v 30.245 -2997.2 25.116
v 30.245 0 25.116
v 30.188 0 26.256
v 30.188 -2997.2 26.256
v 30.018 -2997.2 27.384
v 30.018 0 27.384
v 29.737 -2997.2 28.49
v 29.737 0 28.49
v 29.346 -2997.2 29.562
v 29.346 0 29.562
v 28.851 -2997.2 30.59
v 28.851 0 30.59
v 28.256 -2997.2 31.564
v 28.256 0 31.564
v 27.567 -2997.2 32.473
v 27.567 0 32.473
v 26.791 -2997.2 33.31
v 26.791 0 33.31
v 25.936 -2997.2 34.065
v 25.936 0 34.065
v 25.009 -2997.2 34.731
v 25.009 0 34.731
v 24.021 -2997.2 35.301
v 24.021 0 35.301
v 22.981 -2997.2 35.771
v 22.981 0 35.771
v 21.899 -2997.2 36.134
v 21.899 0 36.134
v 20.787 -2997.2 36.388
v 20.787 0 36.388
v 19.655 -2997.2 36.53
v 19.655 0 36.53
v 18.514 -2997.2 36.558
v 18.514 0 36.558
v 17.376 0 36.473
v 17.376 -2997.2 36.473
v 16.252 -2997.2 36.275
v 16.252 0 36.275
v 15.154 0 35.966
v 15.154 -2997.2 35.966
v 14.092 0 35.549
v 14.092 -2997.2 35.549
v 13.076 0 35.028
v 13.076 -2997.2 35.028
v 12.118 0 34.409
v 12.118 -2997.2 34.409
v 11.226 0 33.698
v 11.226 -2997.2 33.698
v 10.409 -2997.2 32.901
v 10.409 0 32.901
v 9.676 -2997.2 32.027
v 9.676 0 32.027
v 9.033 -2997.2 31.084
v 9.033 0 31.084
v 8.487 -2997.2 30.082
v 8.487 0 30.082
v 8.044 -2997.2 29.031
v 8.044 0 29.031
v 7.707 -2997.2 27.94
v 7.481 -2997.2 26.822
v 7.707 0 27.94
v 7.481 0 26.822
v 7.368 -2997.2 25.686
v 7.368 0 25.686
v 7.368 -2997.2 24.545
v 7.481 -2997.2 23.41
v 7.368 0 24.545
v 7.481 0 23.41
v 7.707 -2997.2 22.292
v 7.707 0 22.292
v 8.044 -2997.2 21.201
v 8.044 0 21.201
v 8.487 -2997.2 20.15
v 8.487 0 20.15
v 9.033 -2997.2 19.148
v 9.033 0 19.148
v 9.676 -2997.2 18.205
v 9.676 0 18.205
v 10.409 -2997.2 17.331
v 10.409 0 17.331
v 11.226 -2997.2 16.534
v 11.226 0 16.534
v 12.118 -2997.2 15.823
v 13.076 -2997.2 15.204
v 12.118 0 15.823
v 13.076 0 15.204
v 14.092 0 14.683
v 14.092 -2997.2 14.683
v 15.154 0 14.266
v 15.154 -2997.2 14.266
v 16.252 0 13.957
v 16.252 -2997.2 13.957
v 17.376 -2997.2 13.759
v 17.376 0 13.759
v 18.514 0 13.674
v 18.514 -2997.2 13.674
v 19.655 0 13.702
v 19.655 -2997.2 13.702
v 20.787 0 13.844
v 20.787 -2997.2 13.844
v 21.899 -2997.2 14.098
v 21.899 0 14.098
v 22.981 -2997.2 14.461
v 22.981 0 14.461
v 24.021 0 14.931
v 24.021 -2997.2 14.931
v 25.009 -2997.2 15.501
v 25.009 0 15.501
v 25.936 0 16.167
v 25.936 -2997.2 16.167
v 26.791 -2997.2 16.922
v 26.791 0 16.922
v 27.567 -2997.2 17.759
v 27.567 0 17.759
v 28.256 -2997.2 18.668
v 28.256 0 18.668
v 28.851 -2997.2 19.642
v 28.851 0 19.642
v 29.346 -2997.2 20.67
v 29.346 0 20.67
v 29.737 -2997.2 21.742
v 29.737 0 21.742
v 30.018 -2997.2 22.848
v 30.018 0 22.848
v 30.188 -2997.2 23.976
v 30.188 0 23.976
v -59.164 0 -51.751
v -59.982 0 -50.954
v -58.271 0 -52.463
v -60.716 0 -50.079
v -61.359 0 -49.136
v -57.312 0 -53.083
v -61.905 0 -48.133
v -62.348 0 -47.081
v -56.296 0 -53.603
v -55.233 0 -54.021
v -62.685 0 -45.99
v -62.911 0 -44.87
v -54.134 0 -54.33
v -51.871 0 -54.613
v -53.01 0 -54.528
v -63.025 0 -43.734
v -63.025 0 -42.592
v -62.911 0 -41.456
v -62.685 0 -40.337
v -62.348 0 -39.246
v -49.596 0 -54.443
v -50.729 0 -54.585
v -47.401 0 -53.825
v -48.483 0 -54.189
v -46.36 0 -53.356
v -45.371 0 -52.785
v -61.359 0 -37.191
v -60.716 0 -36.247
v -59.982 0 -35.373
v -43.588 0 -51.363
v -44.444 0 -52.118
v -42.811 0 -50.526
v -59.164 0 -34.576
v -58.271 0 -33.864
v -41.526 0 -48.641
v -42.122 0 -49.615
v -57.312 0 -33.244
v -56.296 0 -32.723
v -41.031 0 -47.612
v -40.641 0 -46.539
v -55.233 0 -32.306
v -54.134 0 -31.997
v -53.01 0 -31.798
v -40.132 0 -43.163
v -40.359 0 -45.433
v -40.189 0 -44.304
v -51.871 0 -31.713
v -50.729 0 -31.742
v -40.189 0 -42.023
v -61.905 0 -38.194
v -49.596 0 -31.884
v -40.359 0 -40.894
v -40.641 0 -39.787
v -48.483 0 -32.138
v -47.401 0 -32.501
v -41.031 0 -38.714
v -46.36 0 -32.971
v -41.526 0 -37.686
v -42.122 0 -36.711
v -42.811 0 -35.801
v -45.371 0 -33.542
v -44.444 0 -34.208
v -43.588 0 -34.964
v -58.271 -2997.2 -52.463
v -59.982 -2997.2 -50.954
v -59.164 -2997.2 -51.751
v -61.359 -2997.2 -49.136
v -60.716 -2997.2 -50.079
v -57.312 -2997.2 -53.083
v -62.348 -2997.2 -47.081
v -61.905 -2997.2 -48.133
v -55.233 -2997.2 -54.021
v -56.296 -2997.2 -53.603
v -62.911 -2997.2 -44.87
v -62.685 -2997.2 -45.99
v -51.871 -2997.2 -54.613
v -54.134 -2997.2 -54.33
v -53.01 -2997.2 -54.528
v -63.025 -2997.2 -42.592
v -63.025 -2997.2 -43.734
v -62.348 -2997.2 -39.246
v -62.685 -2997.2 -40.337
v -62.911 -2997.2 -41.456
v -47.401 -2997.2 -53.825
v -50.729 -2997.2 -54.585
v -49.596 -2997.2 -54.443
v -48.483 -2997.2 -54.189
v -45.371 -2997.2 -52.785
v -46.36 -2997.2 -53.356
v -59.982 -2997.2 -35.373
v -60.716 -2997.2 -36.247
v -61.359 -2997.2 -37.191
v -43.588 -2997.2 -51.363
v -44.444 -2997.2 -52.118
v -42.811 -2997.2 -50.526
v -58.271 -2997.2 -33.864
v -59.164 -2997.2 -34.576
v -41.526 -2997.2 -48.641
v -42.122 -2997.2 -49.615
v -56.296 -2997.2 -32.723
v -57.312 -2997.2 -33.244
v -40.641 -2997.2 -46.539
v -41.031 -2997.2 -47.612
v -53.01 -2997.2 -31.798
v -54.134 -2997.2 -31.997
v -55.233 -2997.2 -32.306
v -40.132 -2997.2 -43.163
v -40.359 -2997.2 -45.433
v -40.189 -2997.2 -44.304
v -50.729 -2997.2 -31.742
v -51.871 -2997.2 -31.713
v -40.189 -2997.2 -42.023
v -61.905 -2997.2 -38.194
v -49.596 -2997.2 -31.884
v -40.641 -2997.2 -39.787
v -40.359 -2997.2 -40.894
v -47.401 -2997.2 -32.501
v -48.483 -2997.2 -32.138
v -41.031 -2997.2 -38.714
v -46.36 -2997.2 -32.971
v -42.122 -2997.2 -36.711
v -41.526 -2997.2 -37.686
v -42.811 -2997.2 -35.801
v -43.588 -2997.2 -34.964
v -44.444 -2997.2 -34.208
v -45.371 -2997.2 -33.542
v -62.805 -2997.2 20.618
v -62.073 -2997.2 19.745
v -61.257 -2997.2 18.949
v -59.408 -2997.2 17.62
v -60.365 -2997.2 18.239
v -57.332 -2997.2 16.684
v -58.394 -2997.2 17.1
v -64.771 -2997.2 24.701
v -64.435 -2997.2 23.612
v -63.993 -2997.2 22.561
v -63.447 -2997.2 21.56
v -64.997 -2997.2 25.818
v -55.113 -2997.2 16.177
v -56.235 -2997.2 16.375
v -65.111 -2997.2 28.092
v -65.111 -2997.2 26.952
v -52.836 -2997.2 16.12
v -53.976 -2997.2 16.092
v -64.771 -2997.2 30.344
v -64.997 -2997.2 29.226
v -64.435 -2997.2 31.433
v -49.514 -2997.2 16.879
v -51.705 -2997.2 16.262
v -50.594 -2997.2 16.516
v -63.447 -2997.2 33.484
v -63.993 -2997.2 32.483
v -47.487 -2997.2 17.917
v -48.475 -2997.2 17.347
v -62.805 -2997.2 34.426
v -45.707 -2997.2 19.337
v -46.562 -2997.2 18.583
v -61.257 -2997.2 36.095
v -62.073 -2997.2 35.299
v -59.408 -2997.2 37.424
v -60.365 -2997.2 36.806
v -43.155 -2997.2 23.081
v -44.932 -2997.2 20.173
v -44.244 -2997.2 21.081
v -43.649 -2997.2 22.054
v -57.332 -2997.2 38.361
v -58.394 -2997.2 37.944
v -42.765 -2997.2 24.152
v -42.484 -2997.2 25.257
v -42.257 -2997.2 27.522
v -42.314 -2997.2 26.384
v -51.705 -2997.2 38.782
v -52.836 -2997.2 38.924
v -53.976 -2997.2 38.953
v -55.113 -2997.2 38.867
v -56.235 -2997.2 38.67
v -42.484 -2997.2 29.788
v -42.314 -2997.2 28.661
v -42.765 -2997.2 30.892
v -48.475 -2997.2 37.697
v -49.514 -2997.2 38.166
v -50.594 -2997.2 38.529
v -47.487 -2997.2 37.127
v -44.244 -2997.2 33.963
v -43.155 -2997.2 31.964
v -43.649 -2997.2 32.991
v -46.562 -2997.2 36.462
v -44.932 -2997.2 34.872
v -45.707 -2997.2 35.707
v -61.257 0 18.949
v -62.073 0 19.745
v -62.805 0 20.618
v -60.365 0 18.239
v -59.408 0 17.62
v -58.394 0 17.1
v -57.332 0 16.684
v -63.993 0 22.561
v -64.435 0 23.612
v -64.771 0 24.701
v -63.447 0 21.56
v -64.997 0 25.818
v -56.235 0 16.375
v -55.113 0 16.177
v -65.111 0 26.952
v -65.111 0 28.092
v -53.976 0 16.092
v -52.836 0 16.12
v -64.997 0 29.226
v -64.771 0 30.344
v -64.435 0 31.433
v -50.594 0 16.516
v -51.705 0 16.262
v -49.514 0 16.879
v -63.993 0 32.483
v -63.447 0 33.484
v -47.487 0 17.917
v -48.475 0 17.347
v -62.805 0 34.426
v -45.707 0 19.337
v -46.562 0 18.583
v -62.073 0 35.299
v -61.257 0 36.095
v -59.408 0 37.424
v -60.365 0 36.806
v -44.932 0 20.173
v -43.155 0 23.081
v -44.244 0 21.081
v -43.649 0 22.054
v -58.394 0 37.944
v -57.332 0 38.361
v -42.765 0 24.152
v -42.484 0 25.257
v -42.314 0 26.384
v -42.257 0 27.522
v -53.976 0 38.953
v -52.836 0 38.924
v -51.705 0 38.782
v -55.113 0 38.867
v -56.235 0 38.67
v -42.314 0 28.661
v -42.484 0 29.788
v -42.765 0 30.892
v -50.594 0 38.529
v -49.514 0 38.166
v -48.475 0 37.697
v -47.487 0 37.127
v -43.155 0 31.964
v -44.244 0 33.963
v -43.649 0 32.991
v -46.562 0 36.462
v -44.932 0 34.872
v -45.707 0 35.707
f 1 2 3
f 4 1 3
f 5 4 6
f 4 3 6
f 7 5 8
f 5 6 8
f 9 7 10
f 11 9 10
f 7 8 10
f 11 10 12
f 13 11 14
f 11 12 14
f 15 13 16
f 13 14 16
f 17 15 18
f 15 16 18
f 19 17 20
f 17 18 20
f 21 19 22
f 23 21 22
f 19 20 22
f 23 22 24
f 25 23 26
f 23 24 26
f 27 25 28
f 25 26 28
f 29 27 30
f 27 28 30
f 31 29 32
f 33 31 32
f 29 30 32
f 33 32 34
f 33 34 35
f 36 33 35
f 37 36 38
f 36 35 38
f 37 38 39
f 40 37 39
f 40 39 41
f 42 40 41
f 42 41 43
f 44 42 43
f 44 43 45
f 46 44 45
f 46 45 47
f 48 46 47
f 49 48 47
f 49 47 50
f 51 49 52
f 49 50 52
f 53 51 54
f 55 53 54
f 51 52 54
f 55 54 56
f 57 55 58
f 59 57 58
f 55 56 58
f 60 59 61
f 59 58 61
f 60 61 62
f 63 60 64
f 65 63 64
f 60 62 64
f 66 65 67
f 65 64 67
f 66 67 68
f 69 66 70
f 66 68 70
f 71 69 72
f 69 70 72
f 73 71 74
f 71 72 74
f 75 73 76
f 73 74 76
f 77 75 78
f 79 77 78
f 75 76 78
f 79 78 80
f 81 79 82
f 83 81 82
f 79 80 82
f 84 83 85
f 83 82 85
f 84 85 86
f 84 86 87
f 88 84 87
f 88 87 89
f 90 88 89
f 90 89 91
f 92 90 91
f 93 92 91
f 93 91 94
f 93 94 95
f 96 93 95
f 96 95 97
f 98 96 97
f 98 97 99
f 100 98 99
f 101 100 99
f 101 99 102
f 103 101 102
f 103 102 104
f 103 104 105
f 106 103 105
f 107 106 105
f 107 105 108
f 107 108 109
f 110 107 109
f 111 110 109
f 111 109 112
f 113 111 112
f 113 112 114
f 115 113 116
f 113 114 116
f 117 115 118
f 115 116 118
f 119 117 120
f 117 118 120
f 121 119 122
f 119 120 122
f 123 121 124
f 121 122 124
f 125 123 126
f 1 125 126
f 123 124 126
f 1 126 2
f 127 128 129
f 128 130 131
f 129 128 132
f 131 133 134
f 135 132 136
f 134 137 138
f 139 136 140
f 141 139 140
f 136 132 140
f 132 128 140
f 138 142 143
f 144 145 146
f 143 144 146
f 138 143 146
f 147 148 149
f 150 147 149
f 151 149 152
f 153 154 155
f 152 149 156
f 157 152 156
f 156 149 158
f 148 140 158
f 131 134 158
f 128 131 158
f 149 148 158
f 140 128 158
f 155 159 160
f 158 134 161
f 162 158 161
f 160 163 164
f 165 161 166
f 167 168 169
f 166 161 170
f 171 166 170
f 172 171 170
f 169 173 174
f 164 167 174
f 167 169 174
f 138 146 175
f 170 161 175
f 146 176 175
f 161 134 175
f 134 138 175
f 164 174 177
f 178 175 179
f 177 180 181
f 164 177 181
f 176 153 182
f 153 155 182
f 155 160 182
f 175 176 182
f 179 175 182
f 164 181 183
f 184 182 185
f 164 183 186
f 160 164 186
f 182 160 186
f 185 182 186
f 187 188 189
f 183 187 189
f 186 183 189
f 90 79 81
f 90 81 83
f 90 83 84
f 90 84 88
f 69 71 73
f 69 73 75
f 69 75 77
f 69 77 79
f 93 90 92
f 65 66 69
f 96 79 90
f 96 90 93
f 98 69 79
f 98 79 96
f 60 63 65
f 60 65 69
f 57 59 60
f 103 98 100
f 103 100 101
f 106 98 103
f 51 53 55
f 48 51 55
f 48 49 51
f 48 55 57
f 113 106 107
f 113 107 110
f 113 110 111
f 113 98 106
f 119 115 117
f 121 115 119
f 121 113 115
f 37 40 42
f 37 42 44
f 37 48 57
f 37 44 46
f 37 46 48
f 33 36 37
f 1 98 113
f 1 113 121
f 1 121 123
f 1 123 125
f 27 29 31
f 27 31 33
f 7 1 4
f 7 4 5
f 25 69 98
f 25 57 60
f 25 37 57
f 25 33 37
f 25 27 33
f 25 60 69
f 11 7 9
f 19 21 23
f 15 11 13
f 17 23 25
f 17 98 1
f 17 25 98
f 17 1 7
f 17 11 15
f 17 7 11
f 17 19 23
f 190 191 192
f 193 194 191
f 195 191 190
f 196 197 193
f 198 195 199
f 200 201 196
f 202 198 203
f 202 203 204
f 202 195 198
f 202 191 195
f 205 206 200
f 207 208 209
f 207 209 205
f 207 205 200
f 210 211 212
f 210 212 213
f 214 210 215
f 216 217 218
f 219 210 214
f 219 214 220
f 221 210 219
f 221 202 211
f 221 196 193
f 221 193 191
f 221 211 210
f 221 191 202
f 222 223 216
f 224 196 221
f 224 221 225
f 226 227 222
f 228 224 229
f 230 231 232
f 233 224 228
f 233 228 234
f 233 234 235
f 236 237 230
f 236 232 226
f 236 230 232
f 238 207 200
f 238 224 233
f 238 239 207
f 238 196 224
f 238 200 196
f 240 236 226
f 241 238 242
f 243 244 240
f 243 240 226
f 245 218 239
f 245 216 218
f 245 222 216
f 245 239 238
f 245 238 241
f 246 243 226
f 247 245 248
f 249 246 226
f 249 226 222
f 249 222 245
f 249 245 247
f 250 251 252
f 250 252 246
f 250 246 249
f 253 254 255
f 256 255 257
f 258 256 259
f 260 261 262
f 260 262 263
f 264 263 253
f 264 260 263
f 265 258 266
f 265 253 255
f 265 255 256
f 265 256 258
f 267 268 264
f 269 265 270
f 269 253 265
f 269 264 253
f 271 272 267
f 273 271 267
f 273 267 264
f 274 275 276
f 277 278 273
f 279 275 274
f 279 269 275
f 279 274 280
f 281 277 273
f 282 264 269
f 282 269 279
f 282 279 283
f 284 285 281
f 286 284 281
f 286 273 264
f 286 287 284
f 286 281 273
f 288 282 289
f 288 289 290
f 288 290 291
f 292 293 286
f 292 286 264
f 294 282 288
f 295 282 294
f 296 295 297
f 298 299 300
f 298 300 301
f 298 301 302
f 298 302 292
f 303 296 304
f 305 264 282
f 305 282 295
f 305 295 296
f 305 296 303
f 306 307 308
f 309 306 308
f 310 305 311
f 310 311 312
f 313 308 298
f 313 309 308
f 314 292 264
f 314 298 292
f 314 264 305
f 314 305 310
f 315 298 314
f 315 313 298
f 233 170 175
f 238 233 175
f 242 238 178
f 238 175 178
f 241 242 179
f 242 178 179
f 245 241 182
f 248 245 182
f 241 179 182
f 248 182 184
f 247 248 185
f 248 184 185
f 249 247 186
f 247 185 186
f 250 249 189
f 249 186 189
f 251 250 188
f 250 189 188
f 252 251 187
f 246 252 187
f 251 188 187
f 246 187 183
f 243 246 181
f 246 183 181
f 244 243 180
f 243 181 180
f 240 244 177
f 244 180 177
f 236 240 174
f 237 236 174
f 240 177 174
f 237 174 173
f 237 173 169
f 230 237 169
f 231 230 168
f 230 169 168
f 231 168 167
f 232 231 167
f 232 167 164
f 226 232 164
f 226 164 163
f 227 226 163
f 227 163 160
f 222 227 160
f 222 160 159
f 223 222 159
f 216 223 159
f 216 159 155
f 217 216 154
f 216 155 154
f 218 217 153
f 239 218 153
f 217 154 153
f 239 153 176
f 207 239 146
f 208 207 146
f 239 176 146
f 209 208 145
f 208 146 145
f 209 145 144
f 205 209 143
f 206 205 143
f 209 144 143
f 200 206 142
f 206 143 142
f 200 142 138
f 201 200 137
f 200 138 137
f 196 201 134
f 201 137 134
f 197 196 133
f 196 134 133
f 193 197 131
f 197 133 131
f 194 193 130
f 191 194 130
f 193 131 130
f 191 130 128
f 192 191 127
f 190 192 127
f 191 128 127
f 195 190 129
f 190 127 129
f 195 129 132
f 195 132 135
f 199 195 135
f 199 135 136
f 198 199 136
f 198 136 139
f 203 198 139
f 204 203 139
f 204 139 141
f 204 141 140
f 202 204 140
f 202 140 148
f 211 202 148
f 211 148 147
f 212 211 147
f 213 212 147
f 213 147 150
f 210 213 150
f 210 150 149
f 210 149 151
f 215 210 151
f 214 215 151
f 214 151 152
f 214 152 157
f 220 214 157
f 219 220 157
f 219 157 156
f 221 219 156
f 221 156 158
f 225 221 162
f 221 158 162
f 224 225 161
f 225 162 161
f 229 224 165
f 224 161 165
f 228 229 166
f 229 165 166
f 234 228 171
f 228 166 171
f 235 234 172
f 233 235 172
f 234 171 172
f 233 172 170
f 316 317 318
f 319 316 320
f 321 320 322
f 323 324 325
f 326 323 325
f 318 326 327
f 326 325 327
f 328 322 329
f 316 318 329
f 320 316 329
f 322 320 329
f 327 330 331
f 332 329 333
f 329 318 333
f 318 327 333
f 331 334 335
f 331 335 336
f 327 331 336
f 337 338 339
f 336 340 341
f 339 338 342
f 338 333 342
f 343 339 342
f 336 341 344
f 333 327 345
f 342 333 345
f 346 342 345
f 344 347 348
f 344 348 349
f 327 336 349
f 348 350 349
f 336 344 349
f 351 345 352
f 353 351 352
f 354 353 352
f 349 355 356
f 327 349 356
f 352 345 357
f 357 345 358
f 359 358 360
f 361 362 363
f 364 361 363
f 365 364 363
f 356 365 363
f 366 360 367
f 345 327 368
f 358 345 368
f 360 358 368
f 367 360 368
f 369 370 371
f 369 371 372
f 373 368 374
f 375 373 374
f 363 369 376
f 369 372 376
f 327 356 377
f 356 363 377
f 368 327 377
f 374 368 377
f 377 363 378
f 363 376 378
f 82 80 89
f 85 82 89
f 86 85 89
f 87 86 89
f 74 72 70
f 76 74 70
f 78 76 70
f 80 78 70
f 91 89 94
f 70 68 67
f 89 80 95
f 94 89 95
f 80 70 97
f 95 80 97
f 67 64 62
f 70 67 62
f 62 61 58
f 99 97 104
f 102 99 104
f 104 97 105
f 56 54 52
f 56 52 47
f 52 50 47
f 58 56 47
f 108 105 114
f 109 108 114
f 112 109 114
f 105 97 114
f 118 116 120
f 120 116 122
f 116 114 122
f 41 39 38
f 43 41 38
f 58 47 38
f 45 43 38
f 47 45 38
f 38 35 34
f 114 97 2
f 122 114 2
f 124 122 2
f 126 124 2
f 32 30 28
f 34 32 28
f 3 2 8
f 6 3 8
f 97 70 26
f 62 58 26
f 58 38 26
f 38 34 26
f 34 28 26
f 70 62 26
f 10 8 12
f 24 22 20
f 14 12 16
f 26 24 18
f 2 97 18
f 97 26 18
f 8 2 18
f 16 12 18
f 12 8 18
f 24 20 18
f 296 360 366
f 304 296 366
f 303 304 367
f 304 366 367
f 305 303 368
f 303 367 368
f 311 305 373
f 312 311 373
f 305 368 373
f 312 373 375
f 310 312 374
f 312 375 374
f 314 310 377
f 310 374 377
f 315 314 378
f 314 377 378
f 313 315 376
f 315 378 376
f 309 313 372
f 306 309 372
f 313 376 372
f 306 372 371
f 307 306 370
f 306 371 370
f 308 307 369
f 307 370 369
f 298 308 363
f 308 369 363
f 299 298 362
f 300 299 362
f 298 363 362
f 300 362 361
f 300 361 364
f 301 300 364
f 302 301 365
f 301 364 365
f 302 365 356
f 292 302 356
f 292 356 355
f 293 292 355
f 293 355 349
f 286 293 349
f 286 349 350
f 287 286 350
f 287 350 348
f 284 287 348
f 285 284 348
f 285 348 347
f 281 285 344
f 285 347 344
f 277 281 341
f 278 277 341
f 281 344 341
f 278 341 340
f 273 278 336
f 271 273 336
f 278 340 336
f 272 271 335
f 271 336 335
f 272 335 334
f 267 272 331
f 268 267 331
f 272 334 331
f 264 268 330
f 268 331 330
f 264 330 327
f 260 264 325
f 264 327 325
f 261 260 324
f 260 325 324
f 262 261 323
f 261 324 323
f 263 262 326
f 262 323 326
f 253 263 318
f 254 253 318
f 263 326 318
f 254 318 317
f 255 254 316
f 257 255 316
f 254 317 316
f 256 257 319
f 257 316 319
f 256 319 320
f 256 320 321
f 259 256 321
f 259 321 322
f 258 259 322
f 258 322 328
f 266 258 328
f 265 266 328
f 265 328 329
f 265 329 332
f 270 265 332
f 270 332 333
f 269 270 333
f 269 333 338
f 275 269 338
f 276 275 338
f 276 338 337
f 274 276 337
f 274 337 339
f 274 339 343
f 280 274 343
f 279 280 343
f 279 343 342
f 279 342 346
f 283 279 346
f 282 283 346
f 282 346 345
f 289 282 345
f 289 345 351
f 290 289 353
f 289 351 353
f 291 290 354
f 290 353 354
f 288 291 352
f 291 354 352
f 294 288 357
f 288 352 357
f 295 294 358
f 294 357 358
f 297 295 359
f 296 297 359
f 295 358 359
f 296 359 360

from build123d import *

# Parameters (mm, degrees)
F0_R     = 11.433958
F1_DEPTH = 2997.2
F2_R     = 11.445819
F3_DEPTH = 2997.2
F4_R     = 11.453723
F5_DEPTH = 2997.2


with BuildPart() as f1:
    # F0 (on Front) → F1 (new body)
    with BuildSketch(Plane.XZ):
        with Locations((-53.690922, 27.522238)):
            Circle(F0_R)
    extrude(amount=F1_DEPTH)


with BuildPart() as f3:
    # F2 (on Front) → F3 (new body)
    with BuildSketch(Plane.XZ):
        with Locations((18.799342, 25.11592)):
            Circle(F2_R)
    extrude(amount=F3_DEPTH)


with BuildPart() as f5:
    # F4 (on Front) → F5 (new body)
    with BuildSketch(Plane.XZ):
        with Locations((-51.585395, -43.163292)):
            Circle(F4_R)
    extrude(amount=F5_DEPTH)


solid = Compound([f1.part, f3.part, f5.part])
